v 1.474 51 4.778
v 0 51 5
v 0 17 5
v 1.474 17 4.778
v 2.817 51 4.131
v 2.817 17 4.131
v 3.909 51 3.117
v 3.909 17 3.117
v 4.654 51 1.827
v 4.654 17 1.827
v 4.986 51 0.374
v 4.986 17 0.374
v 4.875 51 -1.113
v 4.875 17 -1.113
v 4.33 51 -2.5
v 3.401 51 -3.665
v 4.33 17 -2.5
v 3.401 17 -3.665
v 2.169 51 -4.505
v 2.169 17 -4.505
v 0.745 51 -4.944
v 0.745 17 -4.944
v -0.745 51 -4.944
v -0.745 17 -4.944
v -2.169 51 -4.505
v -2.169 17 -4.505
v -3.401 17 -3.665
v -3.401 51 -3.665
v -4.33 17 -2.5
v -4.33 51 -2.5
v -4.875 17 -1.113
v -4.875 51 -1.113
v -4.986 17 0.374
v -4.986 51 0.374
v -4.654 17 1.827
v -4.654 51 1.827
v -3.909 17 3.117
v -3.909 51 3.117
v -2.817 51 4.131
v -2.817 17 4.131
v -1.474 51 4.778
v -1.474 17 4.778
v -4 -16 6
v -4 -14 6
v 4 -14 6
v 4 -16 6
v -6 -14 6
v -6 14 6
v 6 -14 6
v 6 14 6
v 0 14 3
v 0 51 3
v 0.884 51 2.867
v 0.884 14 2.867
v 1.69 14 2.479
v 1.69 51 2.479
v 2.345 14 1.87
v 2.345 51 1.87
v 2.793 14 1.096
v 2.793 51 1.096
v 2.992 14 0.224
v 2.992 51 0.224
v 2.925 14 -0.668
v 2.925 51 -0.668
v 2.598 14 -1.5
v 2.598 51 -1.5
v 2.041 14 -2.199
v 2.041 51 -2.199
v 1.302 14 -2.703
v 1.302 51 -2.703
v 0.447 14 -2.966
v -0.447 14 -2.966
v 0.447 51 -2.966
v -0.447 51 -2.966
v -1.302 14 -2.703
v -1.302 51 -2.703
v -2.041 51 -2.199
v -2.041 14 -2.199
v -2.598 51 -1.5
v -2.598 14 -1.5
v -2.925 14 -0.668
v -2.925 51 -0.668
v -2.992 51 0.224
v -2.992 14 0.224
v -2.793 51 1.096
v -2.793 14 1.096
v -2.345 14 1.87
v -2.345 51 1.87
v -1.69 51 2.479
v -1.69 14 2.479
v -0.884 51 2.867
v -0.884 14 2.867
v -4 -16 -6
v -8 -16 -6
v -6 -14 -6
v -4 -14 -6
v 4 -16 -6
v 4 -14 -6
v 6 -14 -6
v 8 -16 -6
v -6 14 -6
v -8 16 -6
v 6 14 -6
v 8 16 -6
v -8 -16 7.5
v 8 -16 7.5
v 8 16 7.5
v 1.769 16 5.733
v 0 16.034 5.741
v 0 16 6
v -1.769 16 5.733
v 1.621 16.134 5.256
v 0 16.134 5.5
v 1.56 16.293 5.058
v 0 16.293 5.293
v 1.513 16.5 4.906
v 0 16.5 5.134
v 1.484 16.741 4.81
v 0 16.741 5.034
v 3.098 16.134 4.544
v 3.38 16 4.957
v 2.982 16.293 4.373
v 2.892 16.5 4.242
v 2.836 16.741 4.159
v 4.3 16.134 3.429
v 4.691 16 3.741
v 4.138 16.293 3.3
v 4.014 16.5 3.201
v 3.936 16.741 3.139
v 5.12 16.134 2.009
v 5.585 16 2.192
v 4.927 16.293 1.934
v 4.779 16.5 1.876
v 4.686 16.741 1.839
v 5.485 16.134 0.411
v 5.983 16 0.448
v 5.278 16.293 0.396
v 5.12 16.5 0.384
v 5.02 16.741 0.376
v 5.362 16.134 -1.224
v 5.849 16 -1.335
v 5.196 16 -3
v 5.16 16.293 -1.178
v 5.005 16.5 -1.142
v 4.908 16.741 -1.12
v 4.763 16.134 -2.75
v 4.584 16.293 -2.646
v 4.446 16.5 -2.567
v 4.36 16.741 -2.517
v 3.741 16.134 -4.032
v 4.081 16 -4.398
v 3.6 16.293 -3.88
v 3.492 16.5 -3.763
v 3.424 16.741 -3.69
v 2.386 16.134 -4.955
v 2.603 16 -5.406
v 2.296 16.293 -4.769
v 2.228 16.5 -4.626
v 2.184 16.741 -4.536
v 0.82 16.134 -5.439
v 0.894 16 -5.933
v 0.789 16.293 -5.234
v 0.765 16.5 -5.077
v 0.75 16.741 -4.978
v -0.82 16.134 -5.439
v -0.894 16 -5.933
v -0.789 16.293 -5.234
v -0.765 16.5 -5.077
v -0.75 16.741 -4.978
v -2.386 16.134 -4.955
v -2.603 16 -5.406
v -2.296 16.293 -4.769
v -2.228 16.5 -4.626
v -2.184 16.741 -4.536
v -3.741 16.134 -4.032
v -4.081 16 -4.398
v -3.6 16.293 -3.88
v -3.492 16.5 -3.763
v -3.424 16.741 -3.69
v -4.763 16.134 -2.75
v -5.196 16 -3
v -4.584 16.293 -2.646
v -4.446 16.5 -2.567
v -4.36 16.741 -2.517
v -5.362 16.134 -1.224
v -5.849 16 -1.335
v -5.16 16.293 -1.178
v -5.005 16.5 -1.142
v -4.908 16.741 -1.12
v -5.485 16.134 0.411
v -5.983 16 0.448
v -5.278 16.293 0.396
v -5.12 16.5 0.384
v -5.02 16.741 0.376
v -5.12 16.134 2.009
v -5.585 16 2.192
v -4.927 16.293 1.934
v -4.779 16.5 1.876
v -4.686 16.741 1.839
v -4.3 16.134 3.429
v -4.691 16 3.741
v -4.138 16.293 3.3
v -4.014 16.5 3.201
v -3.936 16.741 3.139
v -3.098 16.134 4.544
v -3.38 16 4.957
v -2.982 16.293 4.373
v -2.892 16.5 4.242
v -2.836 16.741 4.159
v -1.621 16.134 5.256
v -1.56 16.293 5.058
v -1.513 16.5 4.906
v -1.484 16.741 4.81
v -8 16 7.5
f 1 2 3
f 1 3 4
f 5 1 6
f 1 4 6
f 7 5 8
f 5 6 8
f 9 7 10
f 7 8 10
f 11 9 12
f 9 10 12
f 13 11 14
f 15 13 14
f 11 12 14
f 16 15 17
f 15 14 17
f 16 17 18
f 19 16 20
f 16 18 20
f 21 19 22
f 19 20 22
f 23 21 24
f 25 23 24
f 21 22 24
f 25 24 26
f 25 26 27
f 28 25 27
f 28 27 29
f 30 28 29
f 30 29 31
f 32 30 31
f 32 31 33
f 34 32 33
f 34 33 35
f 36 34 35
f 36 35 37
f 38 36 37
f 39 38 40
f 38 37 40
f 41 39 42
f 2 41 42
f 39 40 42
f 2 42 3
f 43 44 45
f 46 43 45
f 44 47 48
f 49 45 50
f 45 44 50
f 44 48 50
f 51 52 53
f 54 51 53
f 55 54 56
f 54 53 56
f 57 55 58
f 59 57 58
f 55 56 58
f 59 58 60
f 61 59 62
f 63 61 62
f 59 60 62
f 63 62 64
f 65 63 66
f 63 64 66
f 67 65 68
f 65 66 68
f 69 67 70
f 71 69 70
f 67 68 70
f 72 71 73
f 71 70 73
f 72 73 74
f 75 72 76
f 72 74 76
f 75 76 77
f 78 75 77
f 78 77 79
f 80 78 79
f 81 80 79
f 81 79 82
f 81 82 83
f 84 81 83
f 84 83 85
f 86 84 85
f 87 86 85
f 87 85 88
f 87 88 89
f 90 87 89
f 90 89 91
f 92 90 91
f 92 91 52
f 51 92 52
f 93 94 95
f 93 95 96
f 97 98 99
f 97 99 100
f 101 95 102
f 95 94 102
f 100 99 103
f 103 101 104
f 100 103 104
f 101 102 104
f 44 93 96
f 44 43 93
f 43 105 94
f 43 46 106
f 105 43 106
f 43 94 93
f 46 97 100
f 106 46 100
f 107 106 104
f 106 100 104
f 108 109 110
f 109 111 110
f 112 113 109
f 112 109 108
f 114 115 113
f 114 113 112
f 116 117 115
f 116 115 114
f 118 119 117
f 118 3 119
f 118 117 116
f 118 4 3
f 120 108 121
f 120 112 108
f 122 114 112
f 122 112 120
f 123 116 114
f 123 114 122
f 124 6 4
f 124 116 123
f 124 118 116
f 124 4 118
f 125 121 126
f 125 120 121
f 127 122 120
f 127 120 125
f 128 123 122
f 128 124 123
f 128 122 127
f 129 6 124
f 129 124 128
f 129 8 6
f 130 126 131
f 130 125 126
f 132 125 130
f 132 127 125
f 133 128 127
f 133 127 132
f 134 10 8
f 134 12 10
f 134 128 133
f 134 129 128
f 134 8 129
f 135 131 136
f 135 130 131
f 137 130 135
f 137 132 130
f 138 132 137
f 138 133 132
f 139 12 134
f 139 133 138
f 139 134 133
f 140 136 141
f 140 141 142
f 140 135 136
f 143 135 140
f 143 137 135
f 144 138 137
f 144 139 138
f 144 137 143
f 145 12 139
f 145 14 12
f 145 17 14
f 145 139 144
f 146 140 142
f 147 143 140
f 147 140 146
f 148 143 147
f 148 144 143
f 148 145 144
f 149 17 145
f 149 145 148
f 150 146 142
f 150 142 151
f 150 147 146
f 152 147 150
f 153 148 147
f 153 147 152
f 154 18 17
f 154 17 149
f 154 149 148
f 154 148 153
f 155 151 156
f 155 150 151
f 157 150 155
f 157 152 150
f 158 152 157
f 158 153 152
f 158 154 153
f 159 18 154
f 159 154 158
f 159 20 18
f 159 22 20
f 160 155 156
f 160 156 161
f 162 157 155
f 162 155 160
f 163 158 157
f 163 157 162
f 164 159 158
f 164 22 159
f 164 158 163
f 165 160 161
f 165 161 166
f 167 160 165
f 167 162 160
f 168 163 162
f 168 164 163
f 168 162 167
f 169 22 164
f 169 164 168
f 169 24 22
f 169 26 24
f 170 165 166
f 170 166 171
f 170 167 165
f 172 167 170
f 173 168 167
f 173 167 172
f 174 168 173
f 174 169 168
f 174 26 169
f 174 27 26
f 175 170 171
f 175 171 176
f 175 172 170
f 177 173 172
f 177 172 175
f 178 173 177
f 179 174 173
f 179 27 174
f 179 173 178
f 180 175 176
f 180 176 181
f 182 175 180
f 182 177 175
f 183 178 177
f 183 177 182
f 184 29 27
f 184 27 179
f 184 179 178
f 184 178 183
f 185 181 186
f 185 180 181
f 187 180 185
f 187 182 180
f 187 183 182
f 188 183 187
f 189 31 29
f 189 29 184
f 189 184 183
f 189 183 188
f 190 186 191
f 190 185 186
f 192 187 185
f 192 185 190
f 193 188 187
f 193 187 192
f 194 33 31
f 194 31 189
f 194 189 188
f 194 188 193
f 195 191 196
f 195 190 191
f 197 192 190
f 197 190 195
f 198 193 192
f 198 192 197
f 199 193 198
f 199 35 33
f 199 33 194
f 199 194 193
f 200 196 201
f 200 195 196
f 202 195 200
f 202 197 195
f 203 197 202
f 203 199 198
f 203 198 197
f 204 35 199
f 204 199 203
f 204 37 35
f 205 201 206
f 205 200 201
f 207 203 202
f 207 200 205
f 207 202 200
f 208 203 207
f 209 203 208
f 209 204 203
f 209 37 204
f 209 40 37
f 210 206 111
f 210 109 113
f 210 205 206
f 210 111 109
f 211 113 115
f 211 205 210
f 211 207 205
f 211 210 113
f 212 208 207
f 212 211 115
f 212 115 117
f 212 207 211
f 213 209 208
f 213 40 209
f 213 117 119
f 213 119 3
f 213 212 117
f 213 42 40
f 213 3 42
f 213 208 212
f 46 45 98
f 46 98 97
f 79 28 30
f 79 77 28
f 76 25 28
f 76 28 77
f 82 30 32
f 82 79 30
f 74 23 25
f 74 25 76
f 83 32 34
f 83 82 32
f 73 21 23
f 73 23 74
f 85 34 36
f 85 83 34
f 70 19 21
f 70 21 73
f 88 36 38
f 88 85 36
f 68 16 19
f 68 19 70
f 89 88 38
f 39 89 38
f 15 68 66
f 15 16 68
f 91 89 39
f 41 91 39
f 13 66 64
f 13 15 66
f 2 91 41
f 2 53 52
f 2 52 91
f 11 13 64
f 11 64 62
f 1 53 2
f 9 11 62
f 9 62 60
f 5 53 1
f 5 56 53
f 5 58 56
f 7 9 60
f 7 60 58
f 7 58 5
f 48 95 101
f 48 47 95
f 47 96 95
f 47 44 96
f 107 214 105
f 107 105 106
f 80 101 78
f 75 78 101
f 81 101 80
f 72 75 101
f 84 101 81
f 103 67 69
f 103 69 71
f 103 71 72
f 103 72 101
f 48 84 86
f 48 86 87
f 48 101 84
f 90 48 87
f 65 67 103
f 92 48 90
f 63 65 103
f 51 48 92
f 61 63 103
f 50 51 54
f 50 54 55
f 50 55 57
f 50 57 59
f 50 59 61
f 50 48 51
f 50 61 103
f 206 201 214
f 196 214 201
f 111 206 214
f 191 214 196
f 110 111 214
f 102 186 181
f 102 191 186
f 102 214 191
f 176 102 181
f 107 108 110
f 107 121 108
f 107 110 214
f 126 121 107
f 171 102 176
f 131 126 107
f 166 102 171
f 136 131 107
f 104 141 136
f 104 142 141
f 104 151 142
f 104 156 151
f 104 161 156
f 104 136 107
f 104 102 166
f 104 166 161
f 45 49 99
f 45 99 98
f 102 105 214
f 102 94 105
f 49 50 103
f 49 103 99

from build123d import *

# Parameters (mm, degrees)
BOSS_EXTRUDE1_DEPTH = 6
SKETCH2_R           = 5
BOSS_EXTRUDE2_DEPTH = 35
FILLET1_R           = 1
SKETCH3_W           = 16
SKETCH3_H           = 32
BOSS_EXTRUDE3_DEPTH = 1.5
CUT_EXTRUDE1_REACH  = 69.891
SKETCH4_R           = 3


with BuildPart() as part:
    # Sketch1 → Boss-Extrude1 (new, symmetric)
    with BuildSketch(Plane.XY):
        Polygon((-6, -14), (-6, 14), (6, 14), (6, -14), (4, -14), (4, -16), (8, -16), (8, 16), (-8, 16), (-8, -16), (-4, -16), (-4, -14), align=None)
    extrude(amount=BOSS_EXTRUDE1_DEPTH, both=True)

    # Sketch2 → Boss-Extrude2 (add)
    with BuildSketch(Plane(origin=(0, 16, 0), x_dir=(1, 0, 0), z_dir=(0, 1, 0))):
        with Locations(Location((0, 0, 0), (0, 0, 270))):
            Circle(SKETCH2_R)
    extrude(amount=BOSS_EXTRUDE2_DEPTH)

    # Fillet1
    fillet1_edges = [part.edges().sort_by_distance(p)[0] for p in [
        (0, 16, -5),
    ]]
    fillet(fillet1_edges, radius=FILLET1_R - 0.0001)  # a hair under: the kernel refuses the full size

    # Sketch3 → Boss-Extrude3 (add)
    with BuildSketch(Plane.XY.offset(6)):
        Rectangle(SKETCH3_W, SKETCH3_H)
    extrude(amount=BOSS_EXTRUDE3_DEPTH)

    # Sketch4 → Cut-Extrude1 (cut, up to next)
    with BuildSketch(Plane(origin=(0, 51, 0), x_dir=(1, 0, 0), z_dir=(0, 1, 0)), mode=Mode.PRIVATE) as cut_extrude1_sk1:
        with Locations(Location((0, 0, 0), (0, 0, 270))):
            Circle(SKETCH4_R)
    cut_extrude1_tool1 = extrude(cut_extrude1_sk1.sketch, amount=-CUT_EXTRUDE1_REACH, mode=Mode.PRIVATE) & part.part
    add(cut_extrude1_tool1.solids().sort_by_distance((0, 51, 0))[0], mode=Mode.SUBTRACT)


solid = part.part
